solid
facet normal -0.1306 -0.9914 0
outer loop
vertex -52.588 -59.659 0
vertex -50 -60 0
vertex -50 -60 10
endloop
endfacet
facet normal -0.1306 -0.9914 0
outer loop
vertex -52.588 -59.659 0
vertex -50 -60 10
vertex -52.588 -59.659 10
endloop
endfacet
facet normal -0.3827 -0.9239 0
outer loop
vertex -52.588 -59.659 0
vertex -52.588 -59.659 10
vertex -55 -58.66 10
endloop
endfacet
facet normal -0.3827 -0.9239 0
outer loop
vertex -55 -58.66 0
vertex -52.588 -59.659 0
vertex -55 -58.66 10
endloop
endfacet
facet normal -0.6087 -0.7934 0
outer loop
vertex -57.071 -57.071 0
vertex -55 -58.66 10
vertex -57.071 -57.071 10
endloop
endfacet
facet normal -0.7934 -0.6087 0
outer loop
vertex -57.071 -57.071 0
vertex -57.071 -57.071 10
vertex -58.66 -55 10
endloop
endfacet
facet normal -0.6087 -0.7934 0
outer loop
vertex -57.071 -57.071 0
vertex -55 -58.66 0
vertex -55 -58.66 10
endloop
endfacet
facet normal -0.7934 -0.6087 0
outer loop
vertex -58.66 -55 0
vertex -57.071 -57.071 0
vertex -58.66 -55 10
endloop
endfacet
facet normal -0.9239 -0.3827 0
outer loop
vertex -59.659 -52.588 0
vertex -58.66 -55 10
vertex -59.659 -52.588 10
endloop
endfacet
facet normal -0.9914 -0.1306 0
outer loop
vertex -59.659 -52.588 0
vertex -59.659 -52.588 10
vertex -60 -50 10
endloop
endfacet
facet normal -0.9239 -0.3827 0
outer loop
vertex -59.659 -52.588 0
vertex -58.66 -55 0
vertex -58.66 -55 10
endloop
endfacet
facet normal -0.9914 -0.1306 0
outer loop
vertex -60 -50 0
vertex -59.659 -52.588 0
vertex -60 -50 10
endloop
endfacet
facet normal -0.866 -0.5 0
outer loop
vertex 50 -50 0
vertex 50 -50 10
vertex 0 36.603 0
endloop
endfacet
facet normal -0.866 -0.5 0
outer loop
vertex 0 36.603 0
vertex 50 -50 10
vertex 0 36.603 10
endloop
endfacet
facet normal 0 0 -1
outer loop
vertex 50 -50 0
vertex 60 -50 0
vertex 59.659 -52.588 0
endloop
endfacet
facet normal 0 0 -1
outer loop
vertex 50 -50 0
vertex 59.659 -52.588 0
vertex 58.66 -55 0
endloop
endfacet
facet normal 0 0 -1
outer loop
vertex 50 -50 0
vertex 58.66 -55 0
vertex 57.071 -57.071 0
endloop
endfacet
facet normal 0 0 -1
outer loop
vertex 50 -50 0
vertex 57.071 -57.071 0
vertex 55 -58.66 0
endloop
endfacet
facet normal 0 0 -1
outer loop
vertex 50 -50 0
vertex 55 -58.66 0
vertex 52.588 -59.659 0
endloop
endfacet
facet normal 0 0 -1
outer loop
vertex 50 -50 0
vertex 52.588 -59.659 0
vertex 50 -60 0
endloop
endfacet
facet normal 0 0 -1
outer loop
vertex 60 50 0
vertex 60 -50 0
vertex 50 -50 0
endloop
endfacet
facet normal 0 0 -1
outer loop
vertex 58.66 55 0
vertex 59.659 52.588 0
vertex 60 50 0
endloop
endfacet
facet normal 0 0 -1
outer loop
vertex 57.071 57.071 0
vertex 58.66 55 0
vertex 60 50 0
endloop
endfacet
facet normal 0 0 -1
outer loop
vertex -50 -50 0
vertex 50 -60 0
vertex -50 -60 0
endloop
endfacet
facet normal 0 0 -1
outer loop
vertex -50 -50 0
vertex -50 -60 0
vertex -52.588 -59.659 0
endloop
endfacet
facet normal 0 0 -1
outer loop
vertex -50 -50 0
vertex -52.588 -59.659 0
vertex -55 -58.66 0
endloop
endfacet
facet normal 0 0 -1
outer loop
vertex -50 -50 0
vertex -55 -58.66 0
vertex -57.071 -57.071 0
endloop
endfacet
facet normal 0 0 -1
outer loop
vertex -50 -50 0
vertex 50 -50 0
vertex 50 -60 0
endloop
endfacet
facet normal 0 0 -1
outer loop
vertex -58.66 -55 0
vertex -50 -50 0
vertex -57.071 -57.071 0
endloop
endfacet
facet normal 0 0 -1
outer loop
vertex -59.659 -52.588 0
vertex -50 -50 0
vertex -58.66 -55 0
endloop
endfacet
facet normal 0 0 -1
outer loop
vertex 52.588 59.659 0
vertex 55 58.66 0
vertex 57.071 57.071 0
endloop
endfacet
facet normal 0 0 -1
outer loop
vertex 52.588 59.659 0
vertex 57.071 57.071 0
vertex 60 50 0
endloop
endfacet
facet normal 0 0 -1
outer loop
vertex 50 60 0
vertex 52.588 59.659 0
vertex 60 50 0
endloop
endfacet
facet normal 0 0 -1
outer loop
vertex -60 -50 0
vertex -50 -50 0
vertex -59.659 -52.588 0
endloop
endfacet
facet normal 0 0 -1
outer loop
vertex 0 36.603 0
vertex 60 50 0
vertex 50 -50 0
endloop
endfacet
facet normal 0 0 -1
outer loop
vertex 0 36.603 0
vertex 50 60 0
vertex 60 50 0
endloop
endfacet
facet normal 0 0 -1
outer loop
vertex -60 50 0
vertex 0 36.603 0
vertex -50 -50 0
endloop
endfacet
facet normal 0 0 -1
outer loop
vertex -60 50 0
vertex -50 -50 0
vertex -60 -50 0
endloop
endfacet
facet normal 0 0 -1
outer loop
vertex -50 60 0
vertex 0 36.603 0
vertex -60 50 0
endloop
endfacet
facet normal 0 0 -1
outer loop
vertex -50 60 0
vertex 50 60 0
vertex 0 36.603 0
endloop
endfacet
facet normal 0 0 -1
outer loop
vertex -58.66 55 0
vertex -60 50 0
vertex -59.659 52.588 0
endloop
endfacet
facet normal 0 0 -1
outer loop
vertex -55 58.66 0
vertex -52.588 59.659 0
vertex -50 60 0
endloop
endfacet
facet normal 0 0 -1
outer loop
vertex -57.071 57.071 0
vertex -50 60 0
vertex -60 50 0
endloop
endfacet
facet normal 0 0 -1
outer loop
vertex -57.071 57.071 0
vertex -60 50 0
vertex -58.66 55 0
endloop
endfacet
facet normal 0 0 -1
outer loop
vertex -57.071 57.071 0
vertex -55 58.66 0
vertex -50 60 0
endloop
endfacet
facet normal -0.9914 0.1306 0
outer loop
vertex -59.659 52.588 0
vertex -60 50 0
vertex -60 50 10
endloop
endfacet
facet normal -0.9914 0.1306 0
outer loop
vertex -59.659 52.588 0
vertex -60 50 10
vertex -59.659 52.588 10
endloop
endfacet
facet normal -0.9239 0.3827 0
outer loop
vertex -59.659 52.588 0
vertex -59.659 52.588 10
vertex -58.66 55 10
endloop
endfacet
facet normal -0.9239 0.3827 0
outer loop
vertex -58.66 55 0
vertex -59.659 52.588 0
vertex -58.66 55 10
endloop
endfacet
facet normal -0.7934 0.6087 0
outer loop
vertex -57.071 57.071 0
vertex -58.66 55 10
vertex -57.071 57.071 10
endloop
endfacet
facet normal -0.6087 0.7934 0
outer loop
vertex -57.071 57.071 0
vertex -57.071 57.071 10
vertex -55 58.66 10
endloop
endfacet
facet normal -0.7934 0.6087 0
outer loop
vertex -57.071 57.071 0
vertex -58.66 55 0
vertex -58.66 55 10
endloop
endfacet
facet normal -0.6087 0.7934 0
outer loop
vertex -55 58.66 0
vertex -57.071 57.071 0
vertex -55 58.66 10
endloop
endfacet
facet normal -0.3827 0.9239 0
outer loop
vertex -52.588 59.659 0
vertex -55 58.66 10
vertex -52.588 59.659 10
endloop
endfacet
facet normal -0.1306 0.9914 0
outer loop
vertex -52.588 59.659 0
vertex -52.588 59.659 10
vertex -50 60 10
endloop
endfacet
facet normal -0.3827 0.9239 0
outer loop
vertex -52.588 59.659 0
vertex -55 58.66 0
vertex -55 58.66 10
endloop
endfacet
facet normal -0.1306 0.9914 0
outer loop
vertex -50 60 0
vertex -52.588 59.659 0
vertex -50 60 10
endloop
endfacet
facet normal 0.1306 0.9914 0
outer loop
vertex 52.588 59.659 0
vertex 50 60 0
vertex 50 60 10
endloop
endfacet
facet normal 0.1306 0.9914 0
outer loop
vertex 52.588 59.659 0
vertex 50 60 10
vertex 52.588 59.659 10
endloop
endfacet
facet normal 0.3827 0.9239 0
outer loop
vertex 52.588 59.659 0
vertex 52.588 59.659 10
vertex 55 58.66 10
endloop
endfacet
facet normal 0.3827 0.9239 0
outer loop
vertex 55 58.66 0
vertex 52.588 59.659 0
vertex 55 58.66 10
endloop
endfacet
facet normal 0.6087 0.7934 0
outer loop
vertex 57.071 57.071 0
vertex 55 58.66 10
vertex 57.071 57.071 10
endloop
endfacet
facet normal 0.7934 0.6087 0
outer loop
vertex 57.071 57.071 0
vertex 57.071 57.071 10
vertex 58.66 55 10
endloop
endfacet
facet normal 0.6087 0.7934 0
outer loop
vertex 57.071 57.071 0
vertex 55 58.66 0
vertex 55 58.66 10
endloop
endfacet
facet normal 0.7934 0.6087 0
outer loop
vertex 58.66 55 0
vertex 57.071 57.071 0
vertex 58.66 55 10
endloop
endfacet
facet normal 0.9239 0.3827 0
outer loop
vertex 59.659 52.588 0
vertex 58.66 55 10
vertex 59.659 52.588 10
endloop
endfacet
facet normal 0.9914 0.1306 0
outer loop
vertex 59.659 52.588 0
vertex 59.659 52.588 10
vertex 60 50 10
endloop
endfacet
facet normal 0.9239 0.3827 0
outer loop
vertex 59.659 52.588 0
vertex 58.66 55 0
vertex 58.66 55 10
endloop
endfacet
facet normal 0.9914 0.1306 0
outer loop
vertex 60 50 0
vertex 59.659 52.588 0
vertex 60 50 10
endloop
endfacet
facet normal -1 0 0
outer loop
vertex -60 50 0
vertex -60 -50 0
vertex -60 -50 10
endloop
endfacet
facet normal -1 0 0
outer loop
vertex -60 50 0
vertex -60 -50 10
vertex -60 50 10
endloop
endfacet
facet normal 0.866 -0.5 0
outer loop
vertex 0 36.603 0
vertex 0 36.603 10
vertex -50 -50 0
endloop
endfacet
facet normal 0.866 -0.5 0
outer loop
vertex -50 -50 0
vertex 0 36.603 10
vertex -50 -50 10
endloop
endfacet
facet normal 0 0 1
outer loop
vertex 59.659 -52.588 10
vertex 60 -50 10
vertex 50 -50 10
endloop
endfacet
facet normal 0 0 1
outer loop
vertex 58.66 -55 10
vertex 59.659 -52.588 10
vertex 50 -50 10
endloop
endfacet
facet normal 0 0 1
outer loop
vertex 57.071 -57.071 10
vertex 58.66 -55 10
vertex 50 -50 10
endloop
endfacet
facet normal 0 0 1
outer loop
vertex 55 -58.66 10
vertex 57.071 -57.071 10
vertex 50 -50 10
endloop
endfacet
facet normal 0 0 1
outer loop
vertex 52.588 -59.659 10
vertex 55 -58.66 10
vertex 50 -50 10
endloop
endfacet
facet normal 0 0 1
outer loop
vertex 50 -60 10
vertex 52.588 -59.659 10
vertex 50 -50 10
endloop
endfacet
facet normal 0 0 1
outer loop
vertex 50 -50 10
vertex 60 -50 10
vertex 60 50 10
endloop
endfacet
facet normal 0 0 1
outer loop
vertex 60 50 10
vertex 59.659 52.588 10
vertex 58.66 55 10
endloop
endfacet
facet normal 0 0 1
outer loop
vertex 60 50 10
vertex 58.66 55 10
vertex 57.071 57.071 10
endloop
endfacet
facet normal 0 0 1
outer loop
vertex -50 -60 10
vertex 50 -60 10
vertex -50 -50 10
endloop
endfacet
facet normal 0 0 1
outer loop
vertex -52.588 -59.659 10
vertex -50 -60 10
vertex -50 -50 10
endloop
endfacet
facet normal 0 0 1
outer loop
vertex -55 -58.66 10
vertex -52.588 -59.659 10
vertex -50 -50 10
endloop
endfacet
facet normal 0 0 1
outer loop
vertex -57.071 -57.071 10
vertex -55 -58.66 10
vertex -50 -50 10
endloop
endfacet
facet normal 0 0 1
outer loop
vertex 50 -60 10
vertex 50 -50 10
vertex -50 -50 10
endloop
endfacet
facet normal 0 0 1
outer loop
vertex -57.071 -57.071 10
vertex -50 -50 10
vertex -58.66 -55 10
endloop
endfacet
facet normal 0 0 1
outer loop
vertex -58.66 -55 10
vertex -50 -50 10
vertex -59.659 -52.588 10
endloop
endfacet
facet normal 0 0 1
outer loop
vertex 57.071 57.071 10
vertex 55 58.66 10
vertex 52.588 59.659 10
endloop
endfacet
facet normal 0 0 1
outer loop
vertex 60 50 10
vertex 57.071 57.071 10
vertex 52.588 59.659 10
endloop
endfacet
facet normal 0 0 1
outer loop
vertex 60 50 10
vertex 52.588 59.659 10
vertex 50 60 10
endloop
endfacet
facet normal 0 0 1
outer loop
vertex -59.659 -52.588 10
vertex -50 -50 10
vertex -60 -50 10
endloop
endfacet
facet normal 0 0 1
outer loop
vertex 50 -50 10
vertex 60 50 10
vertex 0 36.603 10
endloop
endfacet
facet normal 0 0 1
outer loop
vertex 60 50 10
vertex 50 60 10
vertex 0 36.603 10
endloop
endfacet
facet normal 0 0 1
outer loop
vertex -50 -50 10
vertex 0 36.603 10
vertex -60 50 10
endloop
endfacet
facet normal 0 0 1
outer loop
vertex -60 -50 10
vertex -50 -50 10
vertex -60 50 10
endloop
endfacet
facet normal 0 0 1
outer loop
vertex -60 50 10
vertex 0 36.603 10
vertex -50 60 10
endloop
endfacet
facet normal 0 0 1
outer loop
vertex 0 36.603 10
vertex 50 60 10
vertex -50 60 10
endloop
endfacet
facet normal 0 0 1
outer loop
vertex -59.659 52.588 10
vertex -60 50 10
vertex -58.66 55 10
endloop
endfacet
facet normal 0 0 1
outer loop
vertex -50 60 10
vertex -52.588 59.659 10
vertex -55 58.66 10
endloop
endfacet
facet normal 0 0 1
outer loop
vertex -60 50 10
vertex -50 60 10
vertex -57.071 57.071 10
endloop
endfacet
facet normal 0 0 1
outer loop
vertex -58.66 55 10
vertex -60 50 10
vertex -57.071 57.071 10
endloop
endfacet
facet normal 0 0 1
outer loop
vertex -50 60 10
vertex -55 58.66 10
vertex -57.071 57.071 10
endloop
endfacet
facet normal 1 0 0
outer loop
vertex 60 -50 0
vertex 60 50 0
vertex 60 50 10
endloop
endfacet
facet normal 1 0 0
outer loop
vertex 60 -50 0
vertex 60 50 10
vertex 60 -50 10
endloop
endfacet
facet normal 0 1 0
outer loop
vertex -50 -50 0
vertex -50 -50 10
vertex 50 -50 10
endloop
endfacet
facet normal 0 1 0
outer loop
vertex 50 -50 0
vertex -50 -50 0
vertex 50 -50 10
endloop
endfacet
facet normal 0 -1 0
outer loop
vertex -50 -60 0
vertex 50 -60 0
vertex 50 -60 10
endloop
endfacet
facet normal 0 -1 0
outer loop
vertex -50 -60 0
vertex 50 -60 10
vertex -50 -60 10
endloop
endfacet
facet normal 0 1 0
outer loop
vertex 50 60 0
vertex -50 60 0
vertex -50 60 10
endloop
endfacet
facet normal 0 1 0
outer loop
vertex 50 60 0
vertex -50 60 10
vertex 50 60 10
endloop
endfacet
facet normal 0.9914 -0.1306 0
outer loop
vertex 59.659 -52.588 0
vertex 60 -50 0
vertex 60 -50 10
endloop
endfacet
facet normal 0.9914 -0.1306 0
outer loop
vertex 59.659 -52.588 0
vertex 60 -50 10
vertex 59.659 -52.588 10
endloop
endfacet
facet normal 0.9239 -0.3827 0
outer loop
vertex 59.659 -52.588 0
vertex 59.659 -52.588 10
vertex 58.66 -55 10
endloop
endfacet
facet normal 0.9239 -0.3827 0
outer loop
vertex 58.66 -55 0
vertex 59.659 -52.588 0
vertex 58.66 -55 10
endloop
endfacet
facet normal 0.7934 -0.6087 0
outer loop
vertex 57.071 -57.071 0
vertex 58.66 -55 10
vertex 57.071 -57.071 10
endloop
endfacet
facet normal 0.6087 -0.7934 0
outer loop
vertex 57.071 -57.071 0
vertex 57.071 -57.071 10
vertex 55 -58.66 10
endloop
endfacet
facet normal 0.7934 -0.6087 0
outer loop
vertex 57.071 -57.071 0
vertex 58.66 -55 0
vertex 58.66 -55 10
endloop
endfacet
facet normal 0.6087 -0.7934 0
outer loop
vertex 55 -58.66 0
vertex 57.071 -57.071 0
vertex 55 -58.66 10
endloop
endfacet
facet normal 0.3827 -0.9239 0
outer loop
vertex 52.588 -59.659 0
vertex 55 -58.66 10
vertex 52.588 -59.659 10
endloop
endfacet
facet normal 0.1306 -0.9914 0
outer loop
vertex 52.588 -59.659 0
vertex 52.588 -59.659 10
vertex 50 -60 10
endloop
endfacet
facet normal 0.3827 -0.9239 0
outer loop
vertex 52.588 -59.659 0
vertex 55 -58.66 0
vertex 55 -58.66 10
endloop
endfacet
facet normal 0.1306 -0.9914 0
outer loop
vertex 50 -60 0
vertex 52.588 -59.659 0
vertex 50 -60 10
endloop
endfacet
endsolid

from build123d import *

# Parameters (mm, degrees)
BOSS_EXTRUDE1_DEPTH = 10
CUT_EXTRUDE1_DEPTH  = 10


with BuildPart() as part:
    # Sketch1 → Boss-Extrude1 (new body)
    with BuildSketch(Plane.XY):
        with BuildLine():
            Line((-50, 60), (50, 60))
            ThreePointArc((50, 60), (57.071067812, 57.071067812), (60, 50))
            Line((60, 50), (60, -50))
            ThreePointArc((60, -50), (57.071067812, -57.071067812), (50, -60))
            Line((50, -60), (-50, -60))
            ThreePointArc((-50, -60), (-57.071067812, -57.071067812), (-60, -50))
            Line((-60, -50), (-60, 50))
            ThreePointArc((-60, 50), (-57.071067812, 57.071067812), (-50, 60))
        make_face()
    extrude(amount=BOSS_EXTRUDE1_DEPTH)

    # Sketch3 → Cut-Extrude1 (cut)
    with BuildSketch(Plane.XY.offset(10)):
        Polygon((-50, -50), (50, -50), (0, 36.602540378), align=None)
    extrude(amount=-CUT_EXTRUDE1_DEPTH, mode=Mode.SUBTRACT)


solid = part.part
